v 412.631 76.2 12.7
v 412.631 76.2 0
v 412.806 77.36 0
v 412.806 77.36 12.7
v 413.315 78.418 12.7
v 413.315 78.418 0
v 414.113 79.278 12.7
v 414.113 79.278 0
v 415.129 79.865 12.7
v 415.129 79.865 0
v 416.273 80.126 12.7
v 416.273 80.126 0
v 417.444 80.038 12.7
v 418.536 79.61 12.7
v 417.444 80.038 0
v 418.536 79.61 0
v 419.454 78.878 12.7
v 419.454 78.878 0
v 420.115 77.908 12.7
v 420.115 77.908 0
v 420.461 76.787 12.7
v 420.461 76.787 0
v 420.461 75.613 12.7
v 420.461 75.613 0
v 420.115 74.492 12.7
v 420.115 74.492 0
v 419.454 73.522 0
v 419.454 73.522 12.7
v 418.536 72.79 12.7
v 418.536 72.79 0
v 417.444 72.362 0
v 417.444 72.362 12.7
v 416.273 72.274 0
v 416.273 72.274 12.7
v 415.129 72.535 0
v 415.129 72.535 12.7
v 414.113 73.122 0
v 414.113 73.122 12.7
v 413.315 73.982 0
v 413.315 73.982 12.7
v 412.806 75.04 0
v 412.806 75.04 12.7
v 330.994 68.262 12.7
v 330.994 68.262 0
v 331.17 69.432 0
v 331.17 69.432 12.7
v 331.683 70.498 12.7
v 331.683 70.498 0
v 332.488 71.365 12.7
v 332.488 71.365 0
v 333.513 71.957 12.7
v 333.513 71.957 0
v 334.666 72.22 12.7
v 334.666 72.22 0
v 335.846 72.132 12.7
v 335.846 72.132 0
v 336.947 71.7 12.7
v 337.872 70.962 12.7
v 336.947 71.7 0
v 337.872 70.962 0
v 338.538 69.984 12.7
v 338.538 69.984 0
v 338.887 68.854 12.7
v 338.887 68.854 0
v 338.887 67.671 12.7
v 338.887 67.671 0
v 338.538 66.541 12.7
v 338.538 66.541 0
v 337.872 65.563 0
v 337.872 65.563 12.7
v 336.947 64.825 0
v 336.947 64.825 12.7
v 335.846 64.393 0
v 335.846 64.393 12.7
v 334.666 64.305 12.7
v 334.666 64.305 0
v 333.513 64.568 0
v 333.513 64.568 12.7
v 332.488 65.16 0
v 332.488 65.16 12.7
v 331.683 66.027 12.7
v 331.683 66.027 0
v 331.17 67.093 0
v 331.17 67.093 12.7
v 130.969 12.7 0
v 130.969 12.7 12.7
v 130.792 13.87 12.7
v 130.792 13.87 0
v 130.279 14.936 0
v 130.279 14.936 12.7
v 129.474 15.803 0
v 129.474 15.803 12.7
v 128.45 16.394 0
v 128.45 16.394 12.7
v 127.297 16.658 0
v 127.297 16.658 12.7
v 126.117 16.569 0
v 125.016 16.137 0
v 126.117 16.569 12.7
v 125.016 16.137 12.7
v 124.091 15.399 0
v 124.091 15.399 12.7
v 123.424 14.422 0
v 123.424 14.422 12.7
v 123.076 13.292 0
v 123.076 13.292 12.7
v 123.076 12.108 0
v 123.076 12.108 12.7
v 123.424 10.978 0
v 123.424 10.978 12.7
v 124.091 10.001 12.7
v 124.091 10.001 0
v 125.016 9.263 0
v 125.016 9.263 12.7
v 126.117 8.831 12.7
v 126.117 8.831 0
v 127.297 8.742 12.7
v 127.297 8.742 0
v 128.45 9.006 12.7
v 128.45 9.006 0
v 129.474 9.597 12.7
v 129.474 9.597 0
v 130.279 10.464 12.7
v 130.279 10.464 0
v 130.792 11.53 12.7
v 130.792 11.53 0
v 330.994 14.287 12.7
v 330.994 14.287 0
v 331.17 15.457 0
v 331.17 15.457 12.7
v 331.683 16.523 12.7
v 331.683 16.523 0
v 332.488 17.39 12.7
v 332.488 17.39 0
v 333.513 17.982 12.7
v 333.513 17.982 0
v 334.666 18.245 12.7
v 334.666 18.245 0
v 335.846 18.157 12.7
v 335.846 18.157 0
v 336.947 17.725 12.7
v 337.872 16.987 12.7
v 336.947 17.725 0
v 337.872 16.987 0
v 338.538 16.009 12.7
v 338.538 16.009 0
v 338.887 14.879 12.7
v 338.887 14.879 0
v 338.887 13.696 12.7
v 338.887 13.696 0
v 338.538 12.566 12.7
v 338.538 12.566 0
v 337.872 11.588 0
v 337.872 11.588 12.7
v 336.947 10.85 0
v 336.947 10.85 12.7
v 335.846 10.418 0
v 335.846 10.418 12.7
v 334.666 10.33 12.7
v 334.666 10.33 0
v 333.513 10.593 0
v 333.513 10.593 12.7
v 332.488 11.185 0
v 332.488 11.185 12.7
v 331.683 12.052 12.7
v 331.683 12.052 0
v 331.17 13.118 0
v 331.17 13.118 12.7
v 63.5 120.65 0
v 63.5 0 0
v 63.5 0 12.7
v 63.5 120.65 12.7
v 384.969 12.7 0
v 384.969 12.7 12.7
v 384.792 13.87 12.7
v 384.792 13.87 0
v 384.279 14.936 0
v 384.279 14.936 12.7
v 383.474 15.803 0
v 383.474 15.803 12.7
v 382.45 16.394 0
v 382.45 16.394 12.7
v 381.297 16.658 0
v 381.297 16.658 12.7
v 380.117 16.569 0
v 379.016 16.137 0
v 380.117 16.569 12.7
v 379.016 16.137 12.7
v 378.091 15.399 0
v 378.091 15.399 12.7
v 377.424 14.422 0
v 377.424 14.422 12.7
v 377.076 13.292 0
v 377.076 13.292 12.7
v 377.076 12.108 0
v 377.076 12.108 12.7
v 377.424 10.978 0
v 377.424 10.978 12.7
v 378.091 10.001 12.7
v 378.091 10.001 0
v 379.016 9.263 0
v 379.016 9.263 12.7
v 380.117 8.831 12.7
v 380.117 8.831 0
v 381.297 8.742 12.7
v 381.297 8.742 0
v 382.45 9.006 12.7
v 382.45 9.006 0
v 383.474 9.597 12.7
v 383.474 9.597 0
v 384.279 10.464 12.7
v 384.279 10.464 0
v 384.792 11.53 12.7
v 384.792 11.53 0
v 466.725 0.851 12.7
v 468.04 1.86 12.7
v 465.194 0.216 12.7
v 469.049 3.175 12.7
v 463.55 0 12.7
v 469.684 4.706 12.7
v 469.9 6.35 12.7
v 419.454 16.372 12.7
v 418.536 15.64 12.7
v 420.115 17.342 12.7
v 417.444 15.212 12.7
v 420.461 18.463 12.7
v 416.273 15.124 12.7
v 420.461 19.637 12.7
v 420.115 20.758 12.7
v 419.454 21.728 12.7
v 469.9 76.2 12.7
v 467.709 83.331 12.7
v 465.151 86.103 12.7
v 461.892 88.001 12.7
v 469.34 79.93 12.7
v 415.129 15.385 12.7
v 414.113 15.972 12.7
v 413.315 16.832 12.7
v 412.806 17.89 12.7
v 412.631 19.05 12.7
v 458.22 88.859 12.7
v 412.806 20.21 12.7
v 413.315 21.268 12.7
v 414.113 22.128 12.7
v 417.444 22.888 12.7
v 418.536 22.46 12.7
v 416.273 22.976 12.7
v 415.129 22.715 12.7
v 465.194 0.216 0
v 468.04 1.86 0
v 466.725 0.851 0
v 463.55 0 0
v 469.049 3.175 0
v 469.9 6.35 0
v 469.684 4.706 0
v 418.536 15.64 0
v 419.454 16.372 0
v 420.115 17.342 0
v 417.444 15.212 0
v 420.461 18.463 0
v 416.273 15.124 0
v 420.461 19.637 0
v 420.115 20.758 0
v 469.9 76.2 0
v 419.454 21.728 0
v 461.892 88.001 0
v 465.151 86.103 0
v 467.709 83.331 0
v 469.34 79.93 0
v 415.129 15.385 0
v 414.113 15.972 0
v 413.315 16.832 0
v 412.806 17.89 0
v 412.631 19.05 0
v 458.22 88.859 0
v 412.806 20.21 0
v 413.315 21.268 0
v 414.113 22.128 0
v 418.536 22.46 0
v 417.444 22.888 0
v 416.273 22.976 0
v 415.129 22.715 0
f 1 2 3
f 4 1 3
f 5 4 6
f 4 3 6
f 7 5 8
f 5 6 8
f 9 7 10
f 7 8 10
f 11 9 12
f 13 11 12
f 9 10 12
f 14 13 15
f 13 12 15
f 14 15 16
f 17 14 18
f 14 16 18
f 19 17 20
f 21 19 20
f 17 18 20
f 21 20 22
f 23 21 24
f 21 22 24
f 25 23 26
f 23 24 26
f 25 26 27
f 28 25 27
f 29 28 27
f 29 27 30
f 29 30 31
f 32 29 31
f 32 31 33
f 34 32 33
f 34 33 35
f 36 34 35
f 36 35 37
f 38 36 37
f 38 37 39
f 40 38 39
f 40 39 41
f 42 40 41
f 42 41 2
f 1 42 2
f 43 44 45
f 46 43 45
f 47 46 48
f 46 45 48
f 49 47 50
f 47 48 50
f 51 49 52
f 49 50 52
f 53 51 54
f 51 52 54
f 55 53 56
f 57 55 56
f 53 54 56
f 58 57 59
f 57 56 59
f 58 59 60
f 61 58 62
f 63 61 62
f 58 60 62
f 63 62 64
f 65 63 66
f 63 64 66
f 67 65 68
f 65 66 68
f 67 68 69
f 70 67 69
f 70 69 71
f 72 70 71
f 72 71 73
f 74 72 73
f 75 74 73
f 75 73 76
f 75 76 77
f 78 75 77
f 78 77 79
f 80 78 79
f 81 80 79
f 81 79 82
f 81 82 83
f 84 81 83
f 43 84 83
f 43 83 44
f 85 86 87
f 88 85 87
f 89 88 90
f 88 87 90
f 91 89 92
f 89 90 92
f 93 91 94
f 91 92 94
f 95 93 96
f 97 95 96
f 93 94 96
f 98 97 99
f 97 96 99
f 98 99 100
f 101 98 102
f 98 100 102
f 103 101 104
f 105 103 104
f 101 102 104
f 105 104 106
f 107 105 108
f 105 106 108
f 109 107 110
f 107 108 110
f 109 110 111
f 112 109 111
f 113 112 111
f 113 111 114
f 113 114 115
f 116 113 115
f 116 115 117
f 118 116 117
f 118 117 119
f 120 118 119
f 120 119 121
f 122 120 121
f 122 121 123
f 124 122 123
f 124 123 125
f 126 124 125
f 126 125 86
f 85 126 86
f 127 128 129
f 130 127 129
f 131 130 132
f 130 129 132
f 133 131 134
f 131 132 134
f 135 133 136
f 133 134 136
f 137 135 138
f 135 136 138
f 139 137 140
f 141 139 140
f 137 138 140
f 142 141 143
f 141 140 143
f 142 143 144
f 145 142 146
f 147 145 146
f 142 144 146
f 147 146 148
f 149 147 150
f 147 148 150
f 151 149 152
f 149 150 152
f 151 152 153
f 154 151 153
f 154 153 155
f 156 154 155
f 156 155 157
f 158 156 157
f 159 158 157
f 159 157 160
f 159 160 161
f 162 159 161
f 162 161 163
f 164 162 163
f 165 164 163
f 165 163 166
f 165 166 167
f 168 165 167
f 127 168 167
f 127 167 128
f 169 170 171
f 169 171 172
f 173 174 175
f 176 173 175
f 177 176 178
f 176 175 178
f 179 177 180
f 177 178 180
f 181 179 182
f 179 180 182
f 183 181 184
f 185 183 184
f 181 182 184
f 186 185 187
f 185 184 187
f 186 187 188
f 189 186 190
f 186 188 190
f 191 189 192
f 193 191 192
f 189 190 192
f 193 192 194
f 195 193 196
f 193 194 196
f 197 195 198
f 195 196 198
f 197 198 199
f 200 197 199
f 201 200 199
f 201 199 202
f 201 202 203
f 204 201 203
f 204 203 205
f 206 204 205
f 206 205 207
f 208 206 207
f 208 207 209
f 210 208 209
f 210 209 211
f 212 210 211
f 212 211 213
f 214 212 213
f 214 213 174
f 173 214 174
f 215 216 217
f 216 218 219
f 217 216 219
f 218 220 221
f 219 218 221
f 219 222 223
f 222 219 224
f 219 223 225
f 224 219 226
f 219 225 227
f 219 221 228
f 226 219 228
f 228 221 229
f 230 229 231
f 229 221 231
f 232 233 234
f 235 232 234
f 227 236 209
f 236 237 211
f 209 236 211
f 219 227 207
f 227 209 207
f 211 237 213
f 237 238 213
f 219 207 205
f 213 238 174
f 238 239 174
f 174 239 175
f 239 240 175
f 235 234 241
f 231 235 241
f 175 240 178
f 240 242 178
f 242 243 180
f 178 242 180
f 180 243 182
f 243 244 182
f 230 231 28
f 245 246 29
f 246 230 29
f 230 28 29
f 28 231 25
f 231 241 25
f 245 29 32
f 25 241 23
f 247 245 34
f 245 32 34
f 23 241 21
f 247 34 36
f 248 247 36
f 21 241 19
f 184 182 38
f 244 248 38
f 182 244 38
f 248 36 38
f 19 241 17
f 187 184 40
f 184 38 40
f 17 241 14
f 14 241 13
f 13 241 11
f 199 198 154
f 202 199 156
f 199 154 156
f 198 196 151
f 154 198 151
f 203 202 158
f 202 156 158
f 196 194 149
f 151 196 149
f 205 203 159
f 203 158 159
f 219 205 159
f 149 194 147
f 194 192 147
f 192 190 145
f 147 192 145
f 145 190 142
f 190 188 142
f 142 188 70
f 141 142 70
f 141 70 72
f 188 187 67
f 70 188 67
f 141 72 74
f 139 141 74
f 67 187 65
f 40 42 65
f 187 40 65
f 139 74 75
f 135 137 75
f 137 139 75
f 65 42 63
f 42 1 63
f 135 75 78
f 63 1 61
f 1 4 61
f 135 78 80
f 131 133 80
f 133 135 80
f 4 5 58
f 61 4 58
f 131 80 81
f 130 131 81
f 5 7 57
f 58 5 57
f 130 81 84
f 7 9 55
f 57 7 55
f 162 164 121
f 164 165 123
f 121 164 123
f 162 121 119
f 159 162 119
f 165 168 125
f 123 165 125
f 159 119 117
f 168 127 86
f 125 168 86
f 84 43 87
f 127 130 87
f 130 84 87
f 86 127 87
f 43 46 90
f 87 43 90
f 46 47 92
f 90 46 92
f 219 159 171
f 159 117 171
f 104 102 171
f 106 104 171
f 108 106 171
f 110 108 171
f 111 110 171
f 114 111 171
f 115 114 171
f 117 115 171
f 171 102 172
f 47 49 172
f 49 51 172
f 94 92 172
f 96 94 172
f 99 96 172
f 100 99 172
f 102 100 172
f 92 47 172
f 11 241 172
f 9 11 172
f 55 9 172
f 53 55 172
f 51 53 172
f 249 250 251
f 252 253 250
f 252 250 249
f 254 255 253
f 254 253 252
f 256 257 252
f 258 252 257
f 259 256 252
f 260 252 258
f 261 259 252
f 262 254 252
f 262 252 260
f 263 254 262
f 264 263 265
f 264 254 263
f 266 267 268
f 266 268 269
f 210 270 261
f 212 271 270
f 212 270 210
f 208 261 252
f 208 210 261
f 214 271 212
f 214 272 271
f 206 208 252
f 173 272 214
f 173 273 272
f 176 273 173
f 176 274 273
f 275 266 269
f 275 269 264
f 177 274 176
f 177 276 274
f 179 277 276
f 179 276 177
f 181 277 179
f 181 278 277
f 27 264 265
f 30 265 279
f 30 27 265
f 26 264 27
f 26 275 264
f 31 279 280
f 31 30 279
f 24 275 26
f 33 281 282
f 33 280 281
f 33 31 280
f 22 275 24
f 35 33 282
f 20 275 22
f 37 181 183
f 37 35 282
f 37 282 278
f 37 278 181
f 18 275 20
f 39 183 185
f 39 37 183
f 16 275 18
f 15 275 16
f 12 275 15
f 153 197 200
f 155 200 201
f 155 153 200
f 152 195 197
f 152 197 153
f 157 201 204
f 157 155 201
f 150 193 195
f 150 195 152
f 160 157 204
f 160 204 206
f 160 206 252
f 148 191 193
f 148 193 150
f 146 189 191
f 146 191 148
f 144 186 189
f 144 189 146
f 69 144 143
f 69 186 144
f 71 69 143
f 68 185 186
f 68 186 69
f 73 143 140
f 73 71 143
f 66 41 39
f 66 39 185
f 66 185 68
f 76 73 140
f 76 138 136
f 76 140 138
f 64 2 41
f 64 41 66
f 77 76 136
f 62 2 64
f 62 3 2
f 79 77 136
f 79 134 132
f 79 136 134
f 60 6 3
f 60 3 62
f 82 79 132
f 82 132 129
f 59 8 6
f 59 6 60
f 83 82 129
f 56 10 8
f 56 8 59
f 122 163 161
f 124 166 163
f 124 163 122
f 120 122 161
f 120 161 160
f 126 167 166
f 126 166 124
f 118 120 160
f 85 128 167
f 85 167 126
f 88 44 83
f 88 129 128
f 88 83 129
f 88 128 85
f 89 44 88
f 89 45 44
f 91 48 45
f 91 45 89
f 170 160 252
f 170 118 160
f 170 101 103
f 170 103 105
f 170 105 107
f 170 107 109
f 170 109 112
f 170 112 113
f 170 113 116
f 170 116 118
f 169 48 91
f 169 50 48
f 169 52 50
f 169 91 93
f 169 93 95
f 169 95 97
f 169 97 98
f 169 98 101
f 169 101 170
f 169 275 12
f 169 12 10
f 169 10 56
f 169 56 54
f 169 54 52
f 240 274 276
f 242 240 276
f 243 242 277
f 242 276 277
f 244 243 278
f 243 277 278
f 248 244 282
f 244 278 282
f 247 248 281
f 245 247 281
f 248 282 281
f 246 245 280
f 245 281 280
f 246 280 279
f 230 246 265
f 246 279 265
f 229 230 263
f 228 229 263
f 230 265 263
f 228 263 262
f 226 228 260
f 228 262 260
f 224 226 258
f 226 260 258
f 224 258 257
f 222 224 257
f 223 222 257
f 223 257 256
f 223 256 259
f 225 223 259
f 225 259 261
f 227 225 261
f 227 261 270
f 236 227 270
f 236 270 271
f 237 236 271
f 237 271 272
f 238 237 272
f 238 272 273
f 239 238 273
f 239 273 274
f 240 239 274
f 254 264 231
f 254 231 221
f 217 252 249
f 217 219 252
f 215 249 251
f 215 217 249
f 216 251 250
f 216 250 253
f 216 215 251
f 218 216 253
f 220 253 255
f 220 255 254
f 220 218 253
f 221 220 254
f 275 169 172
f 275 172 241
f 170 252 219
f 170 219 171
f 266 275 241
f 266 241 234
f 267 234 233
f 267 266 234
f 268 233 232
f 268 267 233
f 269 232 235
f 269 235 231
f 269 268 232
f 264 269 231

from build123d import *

# Parameters (mm, degrees)
BOSS_EXTRUDE1_DEPTH            = 12.7
SKETCH2_R                      = 3.96875
CUT_EXTRUDE1_DEPTH             = 13.7
FILLET1_R                      = 6.35
SKETCH4_R                      = 3.937
CUT_EXTRUDE2_DEPTH             = 13.7
F_5_16_0_3125_DIAMETER_HOLE1_D = 7.9375


with BuildPart() as part:
    # Sketch1 → Boss-Extrude1 (new body)
    with BuildSketch(Plane.XY):
        with BuildLine():
            Line((63.5, 0), (63.5, 120.65))
            Line((63.5, 120.65), (458.219565432, 88.85900811))
            ThreePointArc((458.219565432, 88.85900811), (466.533768826, 84.812244743), (469.9, 76.2))
            Line((469.9, 76.2), (469.9, 0))
            Line((469.9, 0), (63.5, 0))
        make_face()
    extrude(amount=BOSS_EXTRUDE1_DEPTH)

    # Sketch2 → Cut-Extrude1 (cut, through all)
    with BuildSketch(Plane.XY.offset(12.7)):
        with Locations((127, 12.7)):
            Circle(SKETCH2_R)
        with Locations((381, 12.7)):
            Circle(SKETCH2_R)
    extrude(amount=-CUT_EXTRUDE1_DEPTH, mode=Mode.SUBTRACT)

    # Fillet1
    fillet1_edges = [part.edges().sort_by_distance(p)[0] for p in [
        (469.9, 0, 6.35),
    ]]
    fillet(fillet1_edges, radius=FILLET1_R)

    # Sketch4 → Cut-Extrude2 (cut, through all)
    with BuildSketch(Plane(origin=(0, 0, 0), x_dir=(-1, 0, 0), z_dir=(0, 0, -1))):
        with Locations((-416.56762, 76.2)):
            Circle(SKETCH4_R)
        with Locations((-416.56762, 19.05)):
            Circle(SKETCH4_R)
    extrude(amount=-CUT_EXTRUDE2_DEPTH, mode=Mode.SUBTRACT)

    # 5/16 (0.3125) Diameter Hole1 (through all)
    with Locations(Plane.XY.offset(12.7)):
        with Locations((334.9625, 14.2875), (334.9625, 68.2625)):
            Hole(F_5_16_0_3125_DIAMETER_HOLE1_D / 2)


solid = part.part
